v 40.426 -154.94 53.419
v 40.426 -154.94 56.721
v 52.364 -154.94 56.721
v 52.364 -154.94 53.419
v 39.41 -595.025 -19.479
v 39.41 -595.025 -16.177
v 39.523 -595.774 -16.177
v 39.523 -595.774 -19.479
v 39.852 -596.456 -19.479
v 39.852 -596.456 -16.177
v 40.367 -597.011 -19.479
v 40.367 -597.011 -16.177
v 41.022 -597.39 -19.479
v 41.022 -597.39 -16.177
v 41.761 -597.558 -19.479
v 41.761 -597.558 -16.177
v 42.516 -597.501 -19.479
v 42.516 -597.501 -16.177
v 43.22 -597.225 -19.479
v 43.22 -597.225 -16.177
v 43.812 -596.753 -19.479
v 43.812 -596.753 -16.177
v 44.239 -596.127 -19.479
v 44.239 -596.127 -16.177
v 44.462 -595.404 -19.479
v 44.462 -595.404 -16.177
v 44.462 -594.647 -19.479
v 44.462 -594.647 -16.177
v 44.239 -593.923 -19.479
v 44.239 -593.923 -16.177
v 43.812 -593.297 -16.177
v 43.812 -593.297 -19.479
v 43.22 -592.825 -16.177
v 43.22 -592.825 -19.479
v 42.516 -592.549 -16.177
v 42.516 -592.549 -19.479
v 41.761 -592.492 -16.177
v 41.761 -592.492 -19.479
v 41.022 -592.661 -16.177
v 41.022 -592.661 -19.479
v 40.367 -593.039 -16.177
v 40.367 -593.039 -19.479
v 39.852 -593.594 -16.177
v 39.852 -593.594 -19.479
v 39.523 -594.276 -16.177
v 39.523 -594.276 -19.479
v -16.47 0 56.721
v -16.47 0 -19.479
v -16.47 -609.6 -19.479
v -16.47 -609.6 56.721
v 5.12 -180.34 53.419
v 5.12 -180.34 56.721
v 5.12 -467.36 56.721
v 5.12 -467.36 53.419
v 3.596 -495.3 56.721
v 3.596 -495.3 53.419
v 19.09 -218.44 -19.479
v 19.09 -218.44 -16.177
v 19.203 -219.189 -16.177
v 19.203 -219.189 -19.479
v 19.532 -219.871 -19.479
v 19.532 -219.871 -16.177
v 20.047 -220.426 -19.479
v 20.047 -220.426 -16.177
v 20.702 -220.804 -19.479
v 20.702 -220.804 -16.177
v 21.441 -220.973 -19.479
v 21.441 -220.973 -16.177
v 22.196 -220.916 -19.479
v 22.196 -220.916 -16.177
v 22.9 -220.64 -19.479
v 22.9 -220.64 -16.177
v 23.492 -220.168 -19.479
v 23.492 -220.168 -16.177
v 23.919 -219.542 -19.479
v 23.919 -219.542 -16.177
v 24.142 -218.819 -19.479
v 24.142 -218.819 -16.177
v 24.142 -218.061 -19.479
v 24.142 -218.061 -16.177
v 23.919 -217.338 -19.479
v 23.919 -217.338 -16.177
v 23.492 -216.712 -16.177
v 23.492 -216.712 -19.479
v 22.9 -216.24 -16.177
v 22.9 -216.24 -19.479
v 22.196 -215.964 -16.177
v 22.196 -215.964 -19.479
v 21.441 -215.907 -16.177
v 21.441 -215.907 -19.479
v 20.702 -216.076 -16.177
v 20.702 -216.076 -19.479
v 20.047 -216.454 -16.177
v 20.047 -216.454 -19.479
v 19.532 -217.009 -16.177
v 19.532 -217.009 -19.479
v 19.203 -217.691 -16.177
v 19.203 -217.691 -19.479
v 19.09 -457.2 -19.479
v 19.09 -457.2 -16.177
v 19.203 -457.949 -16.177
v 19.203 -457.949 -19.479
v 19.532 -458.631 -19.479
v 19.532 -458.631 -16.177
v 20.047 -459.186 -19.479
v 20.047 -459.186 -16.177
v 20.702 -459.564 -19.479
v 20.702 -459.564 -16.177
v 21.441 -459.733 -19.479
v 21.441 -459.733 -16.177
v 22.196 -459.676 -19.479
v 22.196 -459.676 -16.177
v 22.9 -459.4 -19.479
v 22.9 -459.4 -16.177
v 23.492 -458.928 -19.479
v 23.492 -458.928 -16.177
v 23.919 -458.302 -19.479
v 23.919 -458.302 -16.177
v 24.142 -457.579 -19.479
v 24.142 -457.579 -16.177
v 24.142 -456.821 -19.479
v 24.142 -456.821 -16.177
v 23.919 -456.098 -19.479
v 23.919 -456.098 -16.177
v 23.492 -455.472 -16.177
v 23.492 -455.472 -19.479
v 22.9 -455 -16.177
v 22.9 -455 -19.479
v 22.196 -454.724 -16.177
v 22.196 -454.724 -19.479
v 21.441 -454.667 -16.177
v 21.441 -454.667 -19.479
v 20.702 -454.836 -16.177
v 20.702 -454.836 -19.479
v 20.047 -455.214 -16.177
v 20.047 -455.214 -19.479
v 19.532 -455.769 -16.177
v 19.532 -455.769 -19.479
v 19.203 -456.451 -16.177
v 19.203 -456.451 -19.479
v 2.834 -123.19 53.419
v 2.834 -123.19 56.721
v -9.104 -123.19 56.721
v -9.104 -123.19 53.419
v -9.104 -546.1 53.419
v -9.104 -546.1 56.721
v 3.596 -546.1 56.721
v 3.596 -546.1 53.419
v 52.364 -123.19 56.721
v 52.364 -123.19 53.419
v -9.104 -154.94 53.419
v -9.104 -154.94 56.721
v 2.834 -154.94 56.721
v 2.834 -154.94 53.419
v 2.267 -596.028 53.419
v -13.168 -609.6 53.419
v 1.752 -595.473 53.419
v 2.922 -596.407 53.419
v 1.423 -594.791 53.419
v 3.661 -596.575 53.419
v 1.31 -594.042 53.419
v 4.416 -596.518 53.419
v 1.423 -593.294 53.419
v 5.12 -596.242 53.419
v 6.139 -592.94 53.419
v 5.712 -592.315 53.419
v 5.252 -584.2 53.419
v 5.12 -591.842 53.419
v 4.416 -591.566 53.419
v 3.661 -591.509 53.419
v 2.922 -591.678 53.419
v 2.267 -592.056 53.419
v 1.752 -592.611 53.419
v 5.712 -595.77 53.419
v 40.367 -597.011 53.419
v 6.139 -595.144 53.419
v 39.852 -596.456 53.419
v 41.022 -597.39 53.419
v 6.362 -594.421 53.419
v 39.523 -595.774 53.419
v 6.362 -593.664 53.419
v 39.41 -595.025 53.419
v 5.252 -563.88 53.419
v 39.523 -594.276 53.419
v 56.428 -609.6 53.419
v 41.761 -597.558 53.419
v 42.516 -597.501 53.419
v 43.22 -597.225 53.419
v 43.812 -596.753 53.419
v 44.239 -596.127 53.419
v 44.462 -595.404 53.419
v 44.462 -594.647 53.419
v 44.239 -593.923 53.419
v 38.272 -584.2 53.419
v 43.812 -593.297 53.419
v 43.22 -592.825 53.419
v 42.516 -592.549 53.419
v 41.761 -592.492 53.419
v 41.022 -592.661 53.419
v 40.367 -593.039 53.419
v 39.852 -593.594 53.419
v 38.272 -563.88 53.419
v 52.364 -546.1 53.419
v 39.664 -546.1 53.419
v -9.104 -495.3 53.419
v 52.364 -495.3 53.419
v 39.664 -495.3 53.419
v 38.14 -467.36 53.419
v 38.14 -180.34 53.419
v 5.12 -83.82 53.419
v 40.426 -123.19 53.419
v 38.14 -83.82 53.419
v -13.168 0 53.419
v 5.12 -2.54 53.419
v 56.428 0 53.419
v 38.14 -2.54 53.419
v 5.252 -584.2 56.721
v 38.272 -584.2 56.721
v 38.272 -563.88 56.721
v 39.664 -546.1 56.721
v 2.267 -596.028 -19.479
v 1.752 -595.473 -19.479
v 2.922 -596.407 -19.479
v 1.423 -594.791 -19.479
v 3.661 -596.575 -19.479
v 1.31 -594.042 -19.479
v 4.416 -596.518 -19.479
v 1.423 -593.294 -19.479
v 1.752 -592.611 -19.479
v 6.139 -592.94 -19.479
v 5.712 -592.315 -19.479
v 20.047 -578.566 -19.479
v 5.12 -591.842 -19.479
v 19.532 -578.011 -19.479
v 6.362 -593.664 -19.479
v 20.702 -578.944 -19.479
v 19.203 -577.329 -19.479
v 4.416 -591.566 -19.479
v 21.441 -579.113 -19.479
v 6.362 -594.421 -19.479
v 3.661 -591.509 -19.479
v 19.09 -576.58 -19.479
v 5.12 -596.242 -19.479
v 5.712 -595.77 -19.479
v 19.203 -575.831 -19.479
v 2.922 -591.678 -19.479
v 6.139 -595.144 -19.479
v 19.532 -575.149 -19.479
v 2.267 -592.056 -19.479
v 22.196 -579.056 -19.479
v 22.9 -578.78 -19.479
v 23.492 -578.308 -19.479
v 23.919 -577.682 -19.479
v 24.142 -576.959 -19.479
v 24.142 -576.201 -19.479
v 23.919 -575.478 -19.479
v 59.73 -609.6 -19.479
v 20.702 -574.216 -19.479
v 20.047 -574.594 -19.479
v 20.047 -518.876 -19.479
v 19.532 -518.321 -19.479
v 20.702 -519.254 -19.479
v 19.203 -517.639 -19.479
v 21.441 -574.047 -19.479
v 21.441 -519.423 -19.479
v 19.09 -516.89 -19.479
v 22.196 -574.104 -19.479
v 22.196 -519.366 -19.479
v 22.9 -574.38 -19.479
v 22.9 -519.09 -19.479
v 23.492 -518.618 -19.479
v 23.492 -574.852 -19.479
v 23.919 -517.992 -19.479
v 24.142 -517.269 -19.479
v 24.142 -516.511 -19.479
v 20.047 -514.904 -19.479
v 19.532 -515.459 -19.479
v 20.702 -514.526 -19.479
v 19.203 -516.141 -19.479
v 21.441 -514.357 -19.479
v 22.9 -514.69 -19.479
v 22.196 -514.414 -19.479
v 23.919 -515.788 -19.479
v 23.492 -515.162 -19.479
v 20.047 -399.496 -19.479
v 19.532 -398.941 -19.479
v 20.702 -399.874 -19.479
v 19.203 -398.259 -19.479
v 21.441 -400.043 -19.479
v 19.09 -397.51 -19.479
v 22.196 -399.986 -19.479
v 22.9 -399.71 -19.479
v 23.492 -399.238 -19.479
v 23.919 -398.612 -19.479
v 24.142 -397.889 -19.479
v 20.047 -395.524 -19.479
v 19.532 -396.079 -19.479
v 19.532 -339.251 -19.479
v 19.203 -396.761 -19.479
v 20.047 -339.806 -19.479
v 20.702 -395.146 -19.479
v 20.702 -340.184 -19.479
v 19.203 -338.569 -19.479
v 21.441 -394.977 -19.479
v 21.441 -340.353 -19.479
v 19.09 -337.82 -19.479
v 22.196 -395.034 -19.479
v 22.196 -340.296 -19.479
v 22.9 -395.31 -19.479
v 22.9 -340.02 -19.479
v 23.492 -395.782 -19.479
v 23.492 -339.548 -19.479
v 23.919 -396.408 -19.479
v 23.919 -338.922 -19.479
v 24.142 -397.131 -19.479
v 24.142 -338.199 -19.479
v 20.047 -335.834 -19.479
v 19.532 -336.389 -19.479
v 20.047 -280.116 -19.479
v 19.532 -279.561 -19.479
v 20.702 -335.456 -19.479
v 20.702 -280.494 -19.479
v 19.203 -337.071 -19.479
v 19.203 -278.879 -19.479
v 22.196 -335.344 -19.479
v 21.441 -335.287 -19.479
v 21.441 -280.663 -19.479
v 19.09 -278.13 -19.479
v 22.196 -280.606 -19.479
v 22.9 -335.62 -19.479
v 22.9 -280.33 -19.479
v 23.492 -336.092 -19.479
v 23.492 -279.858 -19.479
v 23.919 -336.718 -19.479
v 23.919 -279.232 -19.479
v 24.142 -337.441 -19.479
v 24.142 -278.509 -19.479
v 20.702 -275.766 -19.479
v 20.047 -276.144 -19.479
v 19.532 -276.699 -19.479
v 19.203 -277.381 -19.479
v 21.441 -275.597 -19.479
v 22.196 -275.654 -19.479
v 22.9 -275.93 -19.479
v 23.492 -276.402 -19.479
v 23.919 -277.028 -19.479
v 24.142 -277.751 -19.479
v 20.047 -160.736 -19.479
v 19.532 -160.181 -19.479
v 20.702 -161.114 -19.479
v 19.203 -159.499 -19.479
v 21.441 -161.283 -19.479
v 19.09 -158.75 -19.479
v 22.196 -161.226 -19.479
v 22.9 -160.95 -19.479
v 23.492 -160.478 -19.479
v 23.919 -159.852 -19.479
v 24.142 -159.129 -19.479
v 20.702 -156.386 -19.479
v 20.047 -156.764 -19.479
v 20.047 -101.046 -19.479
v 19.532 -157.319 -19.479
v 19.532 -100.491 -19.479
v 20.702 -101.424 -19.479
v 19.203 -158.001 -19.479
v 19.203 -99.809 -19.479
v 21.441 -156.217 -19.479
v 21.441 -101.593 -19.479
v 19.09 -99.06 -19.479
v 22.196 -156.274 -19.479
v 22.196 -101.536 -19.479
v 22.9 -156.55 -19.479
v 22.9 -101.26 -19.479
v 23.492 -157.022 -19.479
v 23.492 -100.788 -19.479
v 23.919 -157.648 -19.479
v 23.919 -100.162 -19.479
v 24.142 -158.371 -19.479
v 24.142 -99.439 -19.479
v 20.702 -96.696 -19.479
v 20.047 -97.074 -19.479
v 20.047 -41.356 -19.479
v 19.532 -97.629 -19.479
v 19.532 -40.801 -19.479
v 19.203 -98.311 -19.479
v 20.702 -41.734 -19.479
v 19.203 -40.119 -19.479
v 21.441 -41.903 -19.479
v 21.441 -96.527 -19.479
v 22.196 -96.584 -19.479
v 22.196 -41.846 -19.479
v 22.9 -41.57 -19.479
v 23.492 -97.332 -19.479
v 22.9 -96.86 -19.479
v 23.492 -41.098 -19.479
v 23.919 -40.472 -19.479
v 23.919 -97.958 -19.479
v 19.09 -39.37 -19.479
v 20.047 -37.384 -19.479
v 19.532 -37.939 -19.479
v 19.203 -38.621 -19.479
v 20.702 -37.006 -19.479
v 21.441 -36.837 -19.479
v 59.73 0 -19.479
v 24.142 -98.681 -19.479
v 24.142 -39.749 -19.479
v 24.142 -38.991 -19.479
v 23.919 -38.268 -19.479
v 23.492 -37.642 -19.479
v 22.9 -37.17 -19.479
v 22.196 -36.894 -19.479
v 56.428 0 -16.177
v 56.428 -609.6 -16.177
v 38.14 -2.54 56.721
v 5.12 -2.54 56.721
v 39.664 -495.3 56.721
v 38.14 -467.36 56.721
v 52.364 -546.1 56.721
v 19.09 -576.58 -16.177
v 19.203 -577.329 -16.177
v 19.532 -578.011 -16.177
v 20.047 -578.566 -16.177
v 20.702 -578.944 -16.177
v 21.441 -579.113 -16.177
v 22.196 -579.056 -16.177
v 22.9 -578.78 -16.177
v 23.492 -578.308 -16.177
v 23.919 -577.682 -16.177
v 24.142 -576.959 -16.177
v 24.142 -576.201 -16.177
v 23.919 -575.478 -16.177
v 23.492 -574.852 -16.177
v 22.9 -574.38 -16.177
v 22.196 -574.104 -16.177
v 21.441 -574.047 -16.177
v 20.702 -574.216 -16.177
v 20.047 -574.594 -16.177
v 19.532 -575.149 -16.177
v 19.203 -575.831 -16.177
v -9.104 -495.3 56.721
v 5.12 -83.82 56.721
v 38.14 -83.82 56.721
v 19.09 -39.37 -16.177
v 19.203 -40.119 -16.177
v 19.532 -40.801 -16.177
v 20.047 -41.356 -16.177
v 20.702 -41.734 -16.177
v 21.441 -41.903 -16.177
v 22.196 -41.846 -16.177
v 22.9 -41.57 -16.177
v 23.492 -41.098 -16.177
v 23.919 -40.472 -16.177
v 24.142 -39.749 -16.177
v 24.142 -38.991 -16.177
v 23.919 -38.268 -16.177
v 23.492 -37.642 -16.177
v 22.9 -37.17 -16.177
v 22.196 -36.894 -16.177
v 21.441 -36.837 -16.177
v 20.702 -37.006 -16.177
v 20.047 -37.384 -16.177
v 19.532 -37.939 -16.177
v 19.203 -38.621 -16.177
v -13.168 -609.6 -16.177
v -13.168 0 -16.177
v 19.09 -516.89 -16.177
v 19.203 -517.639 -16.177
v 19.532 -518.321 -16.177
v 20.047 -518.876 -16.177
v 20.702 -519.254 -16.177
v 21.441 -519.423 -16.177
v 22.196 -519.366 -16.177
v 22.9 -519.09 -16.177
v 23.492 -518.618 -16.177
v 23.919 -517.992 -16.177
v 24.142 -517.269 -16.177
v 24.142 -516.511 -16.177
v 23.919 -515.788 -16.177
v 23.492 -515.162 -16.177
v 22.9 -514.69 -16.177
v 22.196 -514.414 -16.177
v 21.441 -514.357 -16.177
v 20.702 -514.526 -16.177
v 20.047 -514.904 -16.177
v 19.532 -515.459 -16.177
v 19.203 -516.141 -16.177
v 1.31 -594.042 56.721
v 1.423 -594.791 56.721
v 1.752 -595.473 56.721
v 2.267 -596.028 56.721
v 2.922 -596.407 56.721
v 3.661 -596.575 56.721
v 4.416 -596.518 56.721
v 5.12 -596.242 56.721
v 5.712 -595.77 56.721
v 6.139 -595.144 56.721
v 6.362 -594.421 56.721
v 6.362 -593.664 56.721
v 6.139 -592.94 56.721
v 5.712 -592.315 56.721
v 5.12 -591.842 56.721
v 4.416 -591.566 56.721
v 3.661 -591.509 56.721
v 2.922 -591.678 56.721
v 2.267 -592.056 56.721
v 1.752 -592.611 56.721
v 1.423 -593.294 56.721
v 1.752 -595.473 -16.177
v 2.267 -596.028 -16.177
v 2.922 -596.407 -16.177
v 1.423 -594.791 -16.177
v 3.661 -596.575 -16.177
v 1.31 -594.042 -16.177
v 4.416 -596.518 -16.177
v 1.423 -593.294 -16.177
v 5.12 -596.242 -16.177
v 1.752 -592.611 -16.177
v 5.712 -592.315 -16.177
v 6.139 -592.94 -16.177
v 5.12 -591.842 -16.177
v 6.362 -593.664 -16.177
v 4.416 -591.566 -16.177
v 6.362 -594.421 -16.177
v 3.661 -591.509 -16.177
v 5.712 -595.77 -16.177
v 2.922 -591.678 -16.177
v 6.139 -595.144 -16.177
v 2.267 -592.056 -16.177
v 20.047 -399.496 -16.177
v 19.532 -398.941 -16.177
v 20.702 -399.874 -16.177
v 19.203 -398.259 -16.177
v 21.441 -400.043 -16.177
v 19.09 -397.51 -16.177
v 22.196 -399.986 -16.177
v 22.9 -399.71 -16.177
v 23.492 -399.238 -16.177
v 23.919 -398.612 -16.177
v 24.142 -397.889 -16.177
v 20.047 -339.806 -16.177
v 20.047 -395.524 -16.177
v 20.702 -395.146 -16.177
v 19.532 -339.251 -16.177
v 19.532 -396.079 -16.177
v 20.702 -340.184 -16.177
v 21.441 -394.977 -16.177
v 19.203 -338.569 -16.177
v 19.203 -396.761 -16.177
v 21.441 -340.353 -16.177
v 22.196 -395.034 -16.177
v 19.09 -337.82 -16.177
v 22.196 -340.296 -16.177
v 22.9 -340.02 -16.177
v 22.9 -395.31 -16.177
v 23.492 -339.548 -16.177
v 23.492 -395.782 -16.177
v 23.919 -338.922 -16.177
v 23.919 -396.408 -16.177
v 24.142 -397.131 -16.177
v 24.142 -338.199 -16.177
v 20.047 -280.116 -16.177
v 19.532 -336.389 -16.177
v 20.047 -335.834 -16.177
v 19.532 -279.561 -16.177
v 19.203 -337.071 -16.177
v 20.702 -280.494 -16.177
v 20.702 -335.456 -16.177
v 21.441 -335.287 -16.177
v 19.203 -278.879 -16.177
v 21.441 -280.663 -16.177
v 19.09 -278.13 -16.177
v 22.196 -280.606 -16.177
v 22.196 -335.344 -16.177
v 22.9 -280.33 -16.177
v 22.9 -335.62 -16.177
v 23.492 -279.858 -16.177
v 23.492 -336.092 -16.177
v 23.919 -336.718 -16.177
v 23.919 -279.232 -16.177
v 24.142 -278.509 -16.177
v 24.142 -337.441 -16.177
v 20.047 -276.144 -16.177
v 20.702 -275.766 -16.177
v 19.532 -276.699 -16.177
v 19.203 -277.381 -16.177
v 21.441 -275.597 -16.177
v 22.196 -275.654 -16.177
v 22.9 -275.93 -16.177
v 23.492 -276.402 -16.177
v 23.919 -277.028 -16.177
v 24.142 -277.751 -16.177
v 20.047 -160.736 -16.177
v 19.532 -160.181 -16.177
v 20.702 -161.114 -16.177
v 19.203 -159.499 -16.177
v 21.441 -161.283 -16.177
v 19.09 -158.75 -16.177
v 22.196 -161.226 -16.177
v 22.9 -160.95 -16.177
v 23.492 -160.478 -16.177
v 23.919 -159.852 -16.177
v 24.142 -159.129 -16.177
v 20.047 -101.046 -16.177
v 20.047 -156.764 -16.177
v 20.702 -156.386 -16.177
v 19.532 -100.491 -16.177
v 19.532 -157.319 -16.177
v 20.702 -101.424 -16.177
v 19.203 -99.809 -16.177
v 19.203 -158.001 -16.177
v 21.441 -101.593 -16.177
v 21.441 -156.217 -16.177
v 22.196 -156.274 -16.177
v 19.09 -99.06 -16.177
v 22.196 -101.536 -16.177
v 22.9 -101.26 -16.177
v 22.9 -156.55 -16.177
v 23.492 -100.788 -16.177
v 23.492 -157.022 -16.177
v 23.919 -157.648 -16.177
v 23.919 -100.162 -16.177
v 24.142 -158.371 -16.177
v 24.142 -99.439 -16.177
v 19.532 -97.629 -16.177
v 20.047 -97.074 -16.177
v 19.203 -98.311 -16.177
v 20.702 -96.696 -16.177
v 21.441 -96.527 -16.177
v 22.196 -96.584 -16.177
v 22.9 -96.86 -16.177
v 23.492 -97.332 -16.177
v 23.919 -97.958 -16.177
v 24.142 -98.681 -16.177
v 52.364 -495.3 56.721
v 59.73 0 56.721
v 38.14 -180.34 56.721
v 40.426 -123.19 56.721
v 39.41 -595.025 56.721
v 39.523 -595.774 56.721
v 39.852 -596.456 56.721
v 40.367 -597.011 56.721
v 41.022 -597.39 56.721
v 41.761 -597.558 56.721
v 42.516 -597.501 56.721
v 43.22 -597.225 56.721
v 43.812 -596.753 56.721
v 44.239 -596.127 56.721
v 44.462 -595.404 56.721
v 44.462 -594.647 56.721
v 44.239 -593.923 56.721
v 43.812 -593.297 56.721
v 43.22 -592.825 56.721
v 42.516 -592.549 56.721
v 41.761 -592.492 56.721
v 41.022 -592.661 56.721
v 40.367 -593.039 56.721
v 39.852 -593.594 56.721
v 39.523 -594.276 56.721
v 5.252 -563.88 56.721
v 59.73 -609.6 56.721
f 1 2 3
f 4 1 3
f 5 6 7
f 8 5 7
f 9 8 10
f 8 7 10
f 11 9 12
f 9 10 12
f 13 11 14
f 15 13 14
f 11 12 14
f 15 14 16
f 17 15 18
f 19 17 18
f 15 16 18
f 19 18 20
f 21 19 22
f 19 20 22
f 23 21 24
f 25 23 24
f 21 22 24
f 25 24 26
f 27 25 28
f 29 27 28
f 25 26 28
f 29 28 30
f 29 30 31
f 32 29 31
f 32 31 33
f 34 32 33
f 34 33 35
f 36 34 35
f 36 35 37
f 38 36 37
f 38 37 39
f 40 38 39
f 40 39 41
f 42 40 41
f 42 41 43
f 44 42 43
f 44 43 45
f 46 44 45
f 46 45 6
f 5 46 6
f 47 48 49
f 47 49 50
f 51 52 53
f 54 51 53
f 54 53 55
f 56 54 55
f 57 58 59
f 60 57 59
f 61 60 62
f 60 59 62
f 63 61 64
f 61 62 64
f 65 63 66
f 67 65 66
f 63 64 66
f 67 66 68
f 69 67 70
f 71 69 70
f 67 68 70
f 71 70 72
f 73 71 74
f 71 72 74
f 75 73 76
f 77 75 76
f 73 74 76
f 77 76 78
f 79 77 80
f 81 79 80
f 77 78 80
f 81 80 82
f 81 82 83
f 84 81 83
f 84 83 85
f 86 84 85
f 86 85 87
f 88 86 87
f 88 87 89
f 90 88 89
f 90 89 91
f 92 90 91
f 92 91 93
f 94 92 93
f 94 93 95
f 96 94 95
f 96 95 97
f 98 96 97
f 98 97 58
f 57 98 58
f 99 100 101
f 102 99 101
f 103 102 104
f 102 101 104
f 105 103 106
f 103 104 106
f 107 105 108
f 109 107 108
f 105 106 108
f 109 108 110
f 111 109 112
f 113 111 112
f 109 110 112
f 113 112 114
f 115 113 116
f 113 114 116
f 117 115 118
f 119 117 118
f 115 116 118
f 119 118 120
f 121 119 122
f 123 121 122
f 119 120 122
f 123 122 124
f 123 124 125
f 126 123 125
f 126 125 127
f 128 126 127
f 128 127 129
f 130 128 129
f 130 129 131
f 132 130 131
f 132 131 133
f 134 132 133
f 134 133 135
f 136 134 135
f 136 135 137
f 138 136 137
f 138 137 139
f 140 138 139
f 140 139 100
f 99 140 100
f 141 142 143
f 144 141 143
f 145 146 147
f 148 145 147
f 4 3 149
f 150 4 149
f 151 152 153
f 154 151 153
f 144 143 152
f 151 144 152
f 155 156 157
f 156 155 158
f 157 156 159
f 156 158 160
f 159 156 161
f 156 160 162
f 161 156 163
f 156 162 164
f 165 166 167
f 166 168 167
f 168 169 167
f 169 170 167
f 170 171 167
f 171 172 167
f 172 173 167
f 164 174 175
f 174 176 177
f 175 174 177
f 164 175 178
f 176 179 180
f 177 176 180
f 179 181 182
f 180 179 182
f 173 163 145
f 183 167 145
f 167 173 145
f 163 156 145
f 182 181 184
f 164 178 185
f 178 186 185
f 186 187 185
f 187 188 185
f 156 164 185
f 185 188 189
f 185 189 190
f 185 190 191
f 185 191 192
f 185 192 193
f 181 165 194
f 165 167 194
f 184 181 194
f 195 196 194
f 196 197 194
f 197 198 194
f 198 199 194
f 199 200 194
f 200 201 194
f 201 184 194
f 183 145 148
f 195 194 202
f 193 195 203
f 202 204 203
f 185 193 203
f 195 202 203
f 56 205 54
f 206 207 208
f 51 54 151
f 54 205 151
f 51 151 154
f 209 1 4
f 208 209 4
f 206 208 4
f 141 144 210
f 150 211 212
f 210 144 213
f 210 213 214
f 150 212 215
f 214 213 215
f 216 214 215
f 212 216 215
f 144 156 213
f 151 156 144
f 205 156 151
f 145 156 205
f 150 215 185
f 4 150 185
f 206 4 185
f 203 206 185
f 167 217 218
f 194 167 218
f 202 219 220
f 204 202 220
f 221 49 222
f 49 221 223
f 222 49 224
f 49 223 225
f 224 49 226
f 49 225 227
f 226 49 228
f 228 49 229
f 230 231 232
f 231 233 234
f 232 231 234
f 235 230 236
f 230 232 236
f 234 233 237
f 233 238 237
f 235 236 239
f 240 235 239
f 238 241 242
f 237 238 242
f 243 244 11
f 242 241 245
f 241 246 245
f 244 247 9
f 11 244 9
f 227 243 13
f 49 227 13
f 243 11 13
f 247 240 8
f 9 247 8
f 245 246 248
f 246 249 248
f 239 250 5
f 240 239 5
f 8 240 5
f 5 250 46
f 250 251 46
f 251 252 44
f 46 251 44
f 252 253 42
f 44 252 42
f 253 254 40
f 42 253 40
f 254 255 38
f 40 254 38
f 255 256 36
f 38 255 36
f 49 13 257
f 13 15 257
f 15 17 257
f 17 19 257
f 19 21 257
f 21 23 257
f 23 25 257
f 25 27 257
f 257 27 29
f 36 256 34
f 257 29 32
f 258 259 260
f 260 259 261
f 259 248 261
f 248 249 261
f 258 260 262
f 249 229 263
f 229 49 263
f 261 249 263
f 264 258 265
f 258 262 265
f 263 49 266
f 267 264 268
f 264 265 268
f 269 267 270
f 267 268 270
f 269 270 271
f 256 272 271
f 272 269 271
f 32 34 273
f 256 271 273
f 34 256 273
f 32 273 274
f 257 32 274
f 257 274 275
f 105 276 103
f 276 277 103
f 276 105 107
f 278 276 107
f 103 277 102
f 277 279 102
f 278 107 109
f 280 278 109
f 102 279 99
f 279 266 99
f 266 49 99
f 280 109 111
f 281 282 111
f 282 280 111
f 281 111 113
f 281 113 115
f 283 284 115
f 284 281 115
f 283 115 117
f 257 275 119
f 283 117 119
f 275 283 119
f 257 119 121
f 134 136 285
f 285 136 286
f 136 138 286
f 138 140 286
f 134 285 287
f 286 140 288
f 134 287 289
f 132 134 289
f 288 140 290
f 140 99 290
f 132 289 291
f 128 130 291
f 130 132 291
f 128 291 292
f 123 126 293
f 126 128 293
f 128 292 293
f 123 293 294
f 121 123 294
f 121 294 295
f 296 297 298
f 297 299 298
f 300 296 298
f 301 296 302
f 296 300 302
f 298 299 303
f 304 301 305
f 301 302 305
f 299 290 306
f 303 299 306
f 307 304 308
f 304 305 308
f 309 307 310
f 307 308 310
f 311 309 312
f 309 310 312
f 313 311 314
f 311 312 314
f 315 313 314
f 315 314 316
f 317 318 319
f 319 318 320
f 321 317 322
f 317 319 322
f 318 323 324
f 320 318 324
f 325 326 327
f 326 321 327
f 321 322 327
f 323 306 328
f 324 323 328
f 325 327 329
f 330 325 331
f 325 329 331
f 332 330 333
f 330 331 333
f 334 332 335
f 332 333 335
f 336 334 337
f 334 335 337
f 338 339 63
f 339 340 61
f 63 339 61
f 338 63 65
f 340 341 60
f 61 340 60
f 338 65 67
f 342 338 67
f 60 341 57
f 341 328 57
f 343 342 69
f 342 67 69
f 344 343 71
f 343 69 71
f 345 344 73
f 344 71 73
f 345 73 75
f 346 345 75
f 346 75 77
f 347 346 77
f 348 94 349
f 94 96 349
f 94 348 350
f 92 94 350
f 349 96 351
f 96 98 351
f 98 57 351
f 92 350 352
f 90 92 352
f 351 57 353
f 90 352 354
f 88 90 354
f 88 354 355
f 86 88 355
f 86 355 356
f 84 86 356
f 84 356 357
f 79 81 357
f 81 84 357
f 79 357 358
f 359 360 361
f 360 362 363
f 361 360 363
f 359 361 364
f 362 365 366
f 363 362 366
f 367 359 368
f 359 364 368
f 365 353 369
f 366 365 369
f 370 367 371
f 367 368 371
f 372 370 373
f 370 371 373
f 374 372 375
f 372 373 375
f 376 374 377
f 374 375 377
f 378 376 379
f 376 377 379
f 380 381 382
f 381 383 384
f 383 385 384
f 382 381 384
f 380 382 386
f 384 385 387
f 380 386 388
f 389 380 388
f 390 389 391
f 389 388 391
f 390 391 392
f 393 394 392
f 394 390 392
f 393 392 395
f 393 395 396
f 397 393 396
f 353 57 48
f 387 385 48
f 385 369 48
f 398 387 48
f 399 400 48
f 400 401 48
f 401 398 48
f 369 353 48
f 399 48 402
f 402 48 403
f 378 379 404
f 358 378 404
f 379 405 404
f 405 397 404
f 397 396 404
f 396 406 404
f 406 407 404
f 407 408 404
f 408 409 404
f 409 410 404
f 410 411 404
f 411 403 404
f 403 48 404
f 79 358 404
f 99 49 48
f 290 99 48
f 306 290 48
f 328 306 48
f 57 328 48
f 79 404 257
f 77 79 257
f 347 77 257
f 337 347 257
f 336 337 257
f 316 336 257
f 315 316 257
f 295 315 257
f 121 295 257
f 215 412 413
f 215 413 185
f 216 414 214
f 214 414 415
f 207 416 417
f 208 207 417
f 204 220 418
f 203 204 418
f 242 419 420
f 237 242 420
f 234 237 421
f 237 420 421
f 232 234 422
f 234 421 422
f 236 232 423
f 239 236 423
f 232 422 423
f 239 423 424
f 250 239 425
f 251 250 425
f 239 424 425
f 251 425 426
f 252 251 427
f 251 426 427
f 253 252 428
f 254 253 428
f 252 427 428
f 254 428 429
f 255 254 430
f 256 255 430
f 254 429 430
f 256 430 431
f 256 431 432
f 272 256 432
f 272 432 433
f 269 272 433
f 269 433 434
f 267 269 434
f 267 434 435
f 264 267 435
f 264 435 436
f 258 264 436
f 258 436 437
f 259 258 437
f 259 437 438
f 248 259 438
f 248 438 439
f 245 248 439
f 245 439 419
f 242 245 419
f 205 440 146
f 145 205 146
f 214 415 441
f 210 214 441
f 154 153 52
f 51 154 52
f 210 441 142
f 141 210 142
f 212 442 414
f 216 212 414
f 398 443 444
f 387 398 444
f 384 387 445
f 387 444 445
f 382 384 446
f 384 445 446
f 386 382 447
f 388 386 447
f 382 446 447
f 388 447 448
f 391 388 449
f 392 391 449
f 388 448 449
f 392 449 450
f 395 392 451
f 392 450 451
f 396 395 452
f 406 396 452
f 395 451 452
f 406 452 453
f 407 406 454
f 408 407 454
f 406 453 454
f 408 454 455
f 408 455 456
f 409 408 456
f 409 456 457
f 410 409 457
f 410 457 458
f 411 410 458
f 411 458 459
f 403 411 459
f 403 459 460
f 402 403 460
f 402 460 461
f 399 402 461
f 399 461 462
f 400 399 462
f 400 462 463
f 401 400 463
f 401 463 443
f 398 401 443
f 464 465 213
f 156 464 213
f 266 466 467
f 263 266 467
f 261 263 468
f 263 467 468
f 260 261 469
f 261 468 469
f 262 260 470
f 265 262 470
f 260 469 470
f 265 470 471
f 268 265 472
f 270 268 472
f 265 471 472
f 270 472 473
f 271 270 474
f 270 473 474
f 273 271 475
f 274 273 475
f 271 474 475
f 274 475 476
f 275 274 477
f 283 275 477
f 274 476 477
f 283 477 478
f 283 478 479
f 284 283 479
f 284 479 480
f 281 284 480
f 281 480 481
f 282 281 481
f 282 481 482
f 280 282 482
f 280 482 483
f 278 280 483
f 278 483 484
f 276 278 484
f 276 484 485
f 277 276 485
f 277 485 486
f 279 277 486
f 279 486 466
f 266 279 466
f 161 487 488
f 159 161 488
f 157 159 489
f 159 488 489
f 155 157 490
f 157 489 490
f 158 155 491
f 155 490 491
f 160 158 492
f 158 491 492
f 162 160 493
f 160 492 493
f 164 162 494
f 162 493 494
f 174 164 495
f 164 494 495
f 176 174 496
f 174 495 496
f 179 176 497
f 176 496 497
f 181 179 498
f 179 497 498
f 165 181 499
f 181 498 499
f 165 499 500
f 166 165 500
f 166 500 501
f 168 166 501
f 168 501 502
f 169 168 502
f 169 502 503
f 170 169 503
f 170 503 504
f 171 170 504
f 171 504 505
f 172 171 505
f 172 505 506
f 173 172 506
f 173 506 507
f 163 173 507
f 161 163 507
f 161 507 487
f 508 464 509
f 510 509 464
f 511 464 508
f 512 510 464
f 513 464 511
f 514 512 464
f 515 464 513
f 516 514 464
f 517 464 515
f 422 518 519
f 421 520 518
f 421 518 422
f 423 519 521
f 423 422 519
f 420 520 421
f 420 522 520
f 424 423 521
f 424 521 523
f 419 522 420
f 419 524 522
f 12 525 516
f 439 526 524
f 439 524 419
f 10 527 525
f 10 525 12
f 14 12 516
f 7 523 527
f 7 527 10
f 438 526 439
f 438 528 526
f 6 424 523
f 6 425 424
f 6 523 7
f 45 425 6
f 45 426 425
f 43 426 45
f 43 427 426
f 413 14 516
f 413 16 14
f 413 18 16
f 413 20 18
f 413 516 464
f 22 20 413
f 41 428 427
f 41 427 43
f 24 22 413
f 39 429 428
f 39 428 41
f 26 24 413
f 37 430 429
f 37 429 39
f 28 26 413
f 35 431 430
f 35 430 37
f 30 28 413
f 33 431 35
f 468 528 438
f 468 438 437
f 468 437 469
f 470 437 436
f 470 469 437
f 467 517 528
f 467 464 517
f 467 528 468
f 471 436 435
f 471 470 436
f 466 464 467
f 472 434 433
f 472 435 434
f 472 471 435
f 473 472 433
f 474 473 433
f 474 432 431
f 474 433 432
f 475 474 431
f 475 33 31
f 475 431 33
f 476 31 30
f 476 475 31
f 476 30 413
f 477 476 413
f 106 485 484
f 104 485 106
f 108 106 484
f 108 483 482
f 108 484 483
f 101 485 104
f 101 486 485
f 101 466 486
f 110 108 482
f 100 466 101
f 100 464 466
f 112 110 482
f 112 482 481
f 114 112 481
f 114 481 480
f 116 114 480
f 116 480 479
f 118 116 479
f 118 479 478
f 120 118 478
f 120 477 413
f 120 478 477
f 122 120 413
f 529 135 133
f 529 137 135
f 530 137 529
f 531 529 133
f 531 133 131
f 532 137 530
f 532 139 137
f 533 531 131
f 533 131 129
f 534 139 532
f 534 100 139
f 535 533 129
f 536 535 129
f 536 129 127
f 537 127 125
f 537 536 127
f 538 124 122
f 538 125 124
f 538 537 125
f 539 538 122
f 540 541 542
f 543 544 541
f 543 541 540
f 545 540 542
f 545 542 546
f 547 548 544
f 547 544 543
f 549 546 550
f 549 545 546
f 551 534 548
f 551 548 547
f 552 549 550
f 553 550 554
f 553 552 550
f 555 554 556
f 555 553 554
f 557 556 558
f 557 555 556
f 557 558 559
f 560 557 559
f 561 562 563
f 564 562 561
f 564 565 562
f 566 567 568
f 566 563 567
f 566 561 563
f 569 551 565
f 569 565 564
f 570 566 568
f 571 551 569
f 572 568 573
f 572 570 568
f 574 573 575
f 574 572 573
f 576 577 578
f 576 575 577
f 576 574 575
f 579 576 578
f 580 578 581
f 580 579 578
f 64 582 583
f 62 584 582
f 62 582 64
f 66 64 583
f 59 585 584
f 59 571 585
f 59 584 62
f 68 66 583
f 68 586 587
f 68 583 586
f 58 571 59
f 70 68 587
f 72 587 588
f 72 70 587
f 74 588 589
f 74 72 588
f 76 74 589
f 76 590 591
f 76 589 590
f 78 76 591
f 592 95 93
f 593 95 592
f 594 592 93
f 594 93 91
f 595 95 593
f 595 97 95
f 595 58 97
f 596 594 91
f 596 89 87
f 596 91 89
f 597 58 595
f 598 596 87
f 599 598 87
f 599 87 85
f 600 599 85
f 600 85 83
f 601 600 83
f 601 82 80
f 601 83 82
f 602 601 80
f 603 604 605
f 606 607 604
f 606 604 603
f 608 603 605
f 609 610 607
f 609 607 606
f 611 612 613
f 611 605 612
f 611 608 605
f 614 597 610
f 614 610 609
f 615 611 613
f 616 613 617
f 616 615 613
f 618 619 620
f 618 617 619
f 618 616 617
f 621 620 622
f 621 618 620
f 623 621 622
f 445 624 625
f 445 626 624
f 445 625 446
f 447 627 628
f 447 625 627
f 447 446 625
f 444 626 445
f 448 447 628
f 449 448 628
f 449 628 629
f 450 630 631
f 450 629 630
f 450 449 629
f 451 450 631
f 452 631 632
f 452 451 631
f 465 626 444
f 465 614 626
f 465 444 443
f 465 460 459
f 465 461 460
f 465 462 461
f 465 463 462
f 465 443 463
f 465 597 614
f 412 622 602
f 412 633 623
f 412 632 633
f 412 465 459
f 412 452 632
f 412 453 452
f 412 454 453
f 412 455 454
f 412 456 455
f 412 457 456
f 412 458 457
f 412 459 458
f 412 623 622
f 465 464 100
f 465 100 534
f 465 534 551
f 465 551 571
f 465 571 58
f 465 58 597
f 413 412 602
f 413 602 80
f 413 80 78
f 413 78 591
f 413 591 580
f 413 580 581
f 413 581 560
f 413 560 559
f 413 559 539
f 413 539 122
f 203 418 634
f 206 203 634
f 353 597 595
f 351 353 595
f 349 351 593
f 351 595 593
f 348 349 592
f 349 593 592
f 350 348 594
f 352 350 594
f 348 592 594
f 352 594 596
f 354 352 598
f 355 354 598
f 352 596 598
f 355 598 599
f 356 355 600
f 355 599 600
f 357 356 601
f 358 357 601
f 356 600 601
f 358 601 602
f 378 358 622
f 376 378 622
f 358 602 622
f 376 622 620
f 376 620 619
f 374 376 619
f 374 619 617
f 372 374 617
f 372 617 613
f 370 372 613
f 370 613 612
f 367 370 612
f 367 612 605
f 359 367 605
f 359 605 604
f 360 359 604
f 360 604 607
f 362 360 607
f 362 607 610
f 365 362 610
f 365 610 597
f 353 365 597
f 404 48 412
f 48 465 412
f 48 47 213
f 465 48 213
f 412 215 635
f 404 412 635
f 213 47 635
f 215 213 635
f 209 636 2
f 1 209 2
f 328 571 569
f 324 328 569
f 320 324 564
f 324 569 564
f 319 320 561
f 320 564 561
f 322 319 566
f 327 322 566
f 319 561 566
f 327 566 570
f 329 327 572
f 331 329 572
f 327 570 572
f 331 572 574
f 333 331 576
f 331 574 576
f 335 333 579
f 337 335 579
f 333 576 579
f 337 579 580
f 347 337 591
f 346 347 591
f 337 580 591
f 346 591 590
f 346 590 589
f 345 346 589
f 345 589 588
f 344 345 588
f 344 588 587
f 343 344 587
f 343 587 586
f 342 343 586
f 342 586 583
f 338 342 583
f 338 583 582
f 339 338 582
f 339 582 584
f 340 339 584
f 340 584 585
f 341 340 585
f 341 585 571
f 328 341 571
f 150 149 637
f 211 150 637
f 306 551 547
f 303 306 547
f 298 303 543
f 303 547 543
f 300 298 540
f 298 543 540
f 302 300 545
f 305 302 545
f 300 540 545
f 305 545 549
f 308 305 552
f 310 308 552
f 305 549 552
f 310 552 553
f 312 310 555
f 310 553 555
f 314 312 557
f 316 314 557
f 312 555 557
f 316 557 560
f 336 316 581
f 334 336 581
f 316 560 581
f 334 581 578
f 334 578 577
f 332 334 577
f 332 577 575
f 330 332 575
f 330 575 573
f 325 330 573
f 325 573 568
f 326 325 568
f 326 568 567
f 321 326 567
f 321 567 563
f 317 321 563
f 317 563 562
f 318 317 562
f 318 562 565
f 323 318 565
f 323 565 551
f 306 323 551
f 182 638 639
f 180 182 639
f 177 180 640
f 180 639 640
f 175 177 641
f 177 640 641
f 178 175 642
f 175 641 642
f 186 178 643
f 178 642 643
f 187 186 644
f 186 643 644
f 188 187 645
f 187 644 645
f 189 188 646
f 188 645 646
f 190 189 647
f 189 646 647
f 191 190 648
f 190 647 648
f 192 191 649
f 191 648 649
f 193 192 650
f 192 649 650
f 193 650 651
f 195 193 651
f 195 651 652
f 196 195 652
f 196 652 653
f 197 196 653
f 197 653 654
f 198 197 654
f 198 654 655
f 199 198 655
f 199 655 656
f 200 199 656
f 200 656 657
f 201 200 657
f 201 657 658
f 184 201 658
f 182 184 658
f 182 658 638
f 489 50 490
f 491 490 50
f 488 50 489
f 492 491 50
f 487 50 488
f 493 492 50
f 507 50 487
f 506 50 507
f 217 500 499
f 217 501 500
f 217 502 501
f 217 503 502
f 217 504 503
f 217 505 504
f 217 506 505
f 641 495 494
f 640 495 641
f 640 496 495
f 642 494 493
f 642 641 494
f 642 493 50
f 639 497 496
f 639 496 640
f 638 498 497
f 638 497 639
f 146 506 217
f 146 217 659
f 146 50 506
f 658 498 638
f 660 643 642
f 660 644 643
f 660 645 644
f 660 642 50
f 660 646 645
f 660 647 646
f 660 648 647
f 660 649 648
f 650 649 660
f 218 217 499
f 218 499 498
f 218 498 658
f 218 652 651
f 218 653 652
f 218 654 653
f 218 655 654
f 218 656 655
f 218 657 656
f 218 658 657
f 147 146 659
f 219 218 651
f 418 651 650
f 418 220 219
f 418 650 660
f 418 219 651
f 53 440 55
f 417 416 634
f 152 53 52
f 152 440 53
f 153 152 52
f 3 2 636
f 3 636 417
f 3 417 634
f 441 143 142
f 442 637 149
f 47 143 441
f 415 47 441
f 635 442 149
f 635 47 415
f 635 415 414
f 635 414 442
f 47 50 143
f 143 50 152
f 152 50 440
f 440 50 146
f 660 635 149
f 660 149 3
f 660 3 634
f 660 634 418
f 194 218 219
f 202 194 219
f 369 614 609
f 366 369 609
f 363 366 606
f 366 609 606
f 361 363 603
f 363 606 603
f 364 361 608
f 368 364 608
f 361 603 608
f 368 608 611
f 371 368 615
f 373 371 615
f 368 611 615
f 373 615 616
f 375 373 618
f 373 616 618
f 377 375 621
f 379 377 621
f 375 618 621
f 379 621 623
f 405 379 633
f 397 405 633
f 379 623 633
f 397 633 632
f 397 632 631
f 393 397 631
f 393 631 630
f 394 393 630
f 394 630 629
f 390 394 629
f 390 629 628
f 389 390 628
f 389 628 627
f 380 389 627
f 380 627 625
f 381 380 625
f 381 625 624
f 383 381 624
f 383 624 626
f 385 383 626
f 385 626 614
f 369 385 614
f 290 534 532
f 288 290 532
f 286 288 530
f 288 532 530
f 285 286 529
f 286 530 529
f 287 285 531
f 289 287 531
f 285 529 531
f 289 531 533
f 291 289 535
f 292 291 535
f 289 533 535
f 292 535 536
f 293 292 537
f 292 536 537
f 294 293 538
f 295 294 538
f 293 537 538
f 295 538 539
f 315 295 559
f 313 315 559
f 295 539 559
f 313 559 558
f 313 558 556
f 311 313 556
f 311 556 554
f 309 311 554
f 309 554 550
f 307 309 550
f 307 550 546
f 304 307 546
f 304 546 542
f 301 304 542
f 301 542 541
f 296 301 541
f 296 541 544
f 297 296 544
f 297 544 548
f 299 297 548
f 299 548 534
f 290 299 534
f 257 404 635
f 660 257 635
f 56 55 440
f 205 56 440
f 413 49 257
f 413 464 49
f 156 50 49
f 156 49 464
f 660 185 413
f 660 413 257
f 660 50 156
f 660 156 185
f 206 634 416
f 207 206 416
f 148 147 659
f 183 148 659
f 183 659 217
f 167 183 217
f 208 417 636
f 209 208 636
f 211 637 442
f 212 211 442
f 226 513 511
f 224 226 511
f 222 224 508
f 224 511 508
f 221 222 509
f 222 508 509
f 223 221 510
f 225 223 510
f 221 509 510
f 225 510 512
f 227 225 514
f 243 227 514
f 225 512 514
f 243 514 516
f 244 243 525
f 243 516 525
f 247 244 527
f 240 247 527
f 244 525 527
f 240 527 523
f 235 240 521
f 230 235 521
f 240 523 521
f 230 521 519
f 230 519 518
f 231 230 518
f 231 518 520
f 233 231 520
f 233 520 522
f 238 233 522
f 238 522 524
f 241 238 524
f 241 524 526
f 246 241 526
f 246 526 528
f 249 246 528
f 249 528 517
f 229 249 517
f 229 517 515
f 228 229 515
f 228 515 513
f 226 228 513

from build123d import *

# Parameters (mm, degrees)
F0_W     = 76.2
F0_H     = 76.2
F0_W_2   = 69.596
F0_H_2   = 69.596
F1_DEPTH = 609.6
F3_DEPTH = 25.4
F5_D     = 5.08


with BuildPart() as f1:
    # F0 (on Front) → F1 (new body)
    with BuildSketch(Plane.XZ):
        with Locations((21.630452, 18.620882)):
            Rectangle(F0_W, F0_H)
        with Locations((21.630452, 18.620882)):
            Rectangle(F0_W_2, F0_H_2, mode=Mode.SUBTRACT)
    extrude(amount=F1_DEPTH)

    # F2 (on face) → F3 (cut)
    with BuildSketch(Plane.XY.offset(56.720882)):
        Polygon((38.140452, -2.54), (5.120452, -2.54), (5.120452, -83.82), (2.834452, -123.19), (-9.103548, -123.19), (-9.103548, -154.94), (2.834452, -154.94), (5.120452, -180.34), (5.120452, -467.36), (3.596452, -495.3), (-9.103548, -495.3), (-9.103548, -546.1), (3.596452, -546.1), (5.251717, -563.88), (5.251717, -584.2), (38.271717, -584.2), (38.271717, -563.88), (39.664452, -546.1), (52.364452, -546.1), (52.364452, -495.3), (39.664452, -495.3), (38.140452, -467.36), (38.140452, -180.34), (40.426452, -154.94), (52.364452, -154.94), (52.364452, -123.19), (40.426452, -123.19), (38.140452, -83.82), align=None)
    extrude(amount=-F3_DEPTH, mode=Mode.SUBTRACT)

    # F5 (through all)
    with Locations(Plane(origin=(0, 0, -19.479118), x_dir=(1, 0, 0), z_dir=(0, 0, -1))):
        with Locations((21.630452, 576.58), (21.630452, 516.89), (21.630452, 457.2), (21.630452, 397.51), (21.630452, 337.82), (21.630452, 278.13), (21.630452, 218.44), (21.630452, 158.75), (21.630452, 99.06), (21.630452, 39.37), (3.850452, 594.042182), (41.950452, 595.025122)):
            Hole(F5_D / 2)


solid = f1.part
